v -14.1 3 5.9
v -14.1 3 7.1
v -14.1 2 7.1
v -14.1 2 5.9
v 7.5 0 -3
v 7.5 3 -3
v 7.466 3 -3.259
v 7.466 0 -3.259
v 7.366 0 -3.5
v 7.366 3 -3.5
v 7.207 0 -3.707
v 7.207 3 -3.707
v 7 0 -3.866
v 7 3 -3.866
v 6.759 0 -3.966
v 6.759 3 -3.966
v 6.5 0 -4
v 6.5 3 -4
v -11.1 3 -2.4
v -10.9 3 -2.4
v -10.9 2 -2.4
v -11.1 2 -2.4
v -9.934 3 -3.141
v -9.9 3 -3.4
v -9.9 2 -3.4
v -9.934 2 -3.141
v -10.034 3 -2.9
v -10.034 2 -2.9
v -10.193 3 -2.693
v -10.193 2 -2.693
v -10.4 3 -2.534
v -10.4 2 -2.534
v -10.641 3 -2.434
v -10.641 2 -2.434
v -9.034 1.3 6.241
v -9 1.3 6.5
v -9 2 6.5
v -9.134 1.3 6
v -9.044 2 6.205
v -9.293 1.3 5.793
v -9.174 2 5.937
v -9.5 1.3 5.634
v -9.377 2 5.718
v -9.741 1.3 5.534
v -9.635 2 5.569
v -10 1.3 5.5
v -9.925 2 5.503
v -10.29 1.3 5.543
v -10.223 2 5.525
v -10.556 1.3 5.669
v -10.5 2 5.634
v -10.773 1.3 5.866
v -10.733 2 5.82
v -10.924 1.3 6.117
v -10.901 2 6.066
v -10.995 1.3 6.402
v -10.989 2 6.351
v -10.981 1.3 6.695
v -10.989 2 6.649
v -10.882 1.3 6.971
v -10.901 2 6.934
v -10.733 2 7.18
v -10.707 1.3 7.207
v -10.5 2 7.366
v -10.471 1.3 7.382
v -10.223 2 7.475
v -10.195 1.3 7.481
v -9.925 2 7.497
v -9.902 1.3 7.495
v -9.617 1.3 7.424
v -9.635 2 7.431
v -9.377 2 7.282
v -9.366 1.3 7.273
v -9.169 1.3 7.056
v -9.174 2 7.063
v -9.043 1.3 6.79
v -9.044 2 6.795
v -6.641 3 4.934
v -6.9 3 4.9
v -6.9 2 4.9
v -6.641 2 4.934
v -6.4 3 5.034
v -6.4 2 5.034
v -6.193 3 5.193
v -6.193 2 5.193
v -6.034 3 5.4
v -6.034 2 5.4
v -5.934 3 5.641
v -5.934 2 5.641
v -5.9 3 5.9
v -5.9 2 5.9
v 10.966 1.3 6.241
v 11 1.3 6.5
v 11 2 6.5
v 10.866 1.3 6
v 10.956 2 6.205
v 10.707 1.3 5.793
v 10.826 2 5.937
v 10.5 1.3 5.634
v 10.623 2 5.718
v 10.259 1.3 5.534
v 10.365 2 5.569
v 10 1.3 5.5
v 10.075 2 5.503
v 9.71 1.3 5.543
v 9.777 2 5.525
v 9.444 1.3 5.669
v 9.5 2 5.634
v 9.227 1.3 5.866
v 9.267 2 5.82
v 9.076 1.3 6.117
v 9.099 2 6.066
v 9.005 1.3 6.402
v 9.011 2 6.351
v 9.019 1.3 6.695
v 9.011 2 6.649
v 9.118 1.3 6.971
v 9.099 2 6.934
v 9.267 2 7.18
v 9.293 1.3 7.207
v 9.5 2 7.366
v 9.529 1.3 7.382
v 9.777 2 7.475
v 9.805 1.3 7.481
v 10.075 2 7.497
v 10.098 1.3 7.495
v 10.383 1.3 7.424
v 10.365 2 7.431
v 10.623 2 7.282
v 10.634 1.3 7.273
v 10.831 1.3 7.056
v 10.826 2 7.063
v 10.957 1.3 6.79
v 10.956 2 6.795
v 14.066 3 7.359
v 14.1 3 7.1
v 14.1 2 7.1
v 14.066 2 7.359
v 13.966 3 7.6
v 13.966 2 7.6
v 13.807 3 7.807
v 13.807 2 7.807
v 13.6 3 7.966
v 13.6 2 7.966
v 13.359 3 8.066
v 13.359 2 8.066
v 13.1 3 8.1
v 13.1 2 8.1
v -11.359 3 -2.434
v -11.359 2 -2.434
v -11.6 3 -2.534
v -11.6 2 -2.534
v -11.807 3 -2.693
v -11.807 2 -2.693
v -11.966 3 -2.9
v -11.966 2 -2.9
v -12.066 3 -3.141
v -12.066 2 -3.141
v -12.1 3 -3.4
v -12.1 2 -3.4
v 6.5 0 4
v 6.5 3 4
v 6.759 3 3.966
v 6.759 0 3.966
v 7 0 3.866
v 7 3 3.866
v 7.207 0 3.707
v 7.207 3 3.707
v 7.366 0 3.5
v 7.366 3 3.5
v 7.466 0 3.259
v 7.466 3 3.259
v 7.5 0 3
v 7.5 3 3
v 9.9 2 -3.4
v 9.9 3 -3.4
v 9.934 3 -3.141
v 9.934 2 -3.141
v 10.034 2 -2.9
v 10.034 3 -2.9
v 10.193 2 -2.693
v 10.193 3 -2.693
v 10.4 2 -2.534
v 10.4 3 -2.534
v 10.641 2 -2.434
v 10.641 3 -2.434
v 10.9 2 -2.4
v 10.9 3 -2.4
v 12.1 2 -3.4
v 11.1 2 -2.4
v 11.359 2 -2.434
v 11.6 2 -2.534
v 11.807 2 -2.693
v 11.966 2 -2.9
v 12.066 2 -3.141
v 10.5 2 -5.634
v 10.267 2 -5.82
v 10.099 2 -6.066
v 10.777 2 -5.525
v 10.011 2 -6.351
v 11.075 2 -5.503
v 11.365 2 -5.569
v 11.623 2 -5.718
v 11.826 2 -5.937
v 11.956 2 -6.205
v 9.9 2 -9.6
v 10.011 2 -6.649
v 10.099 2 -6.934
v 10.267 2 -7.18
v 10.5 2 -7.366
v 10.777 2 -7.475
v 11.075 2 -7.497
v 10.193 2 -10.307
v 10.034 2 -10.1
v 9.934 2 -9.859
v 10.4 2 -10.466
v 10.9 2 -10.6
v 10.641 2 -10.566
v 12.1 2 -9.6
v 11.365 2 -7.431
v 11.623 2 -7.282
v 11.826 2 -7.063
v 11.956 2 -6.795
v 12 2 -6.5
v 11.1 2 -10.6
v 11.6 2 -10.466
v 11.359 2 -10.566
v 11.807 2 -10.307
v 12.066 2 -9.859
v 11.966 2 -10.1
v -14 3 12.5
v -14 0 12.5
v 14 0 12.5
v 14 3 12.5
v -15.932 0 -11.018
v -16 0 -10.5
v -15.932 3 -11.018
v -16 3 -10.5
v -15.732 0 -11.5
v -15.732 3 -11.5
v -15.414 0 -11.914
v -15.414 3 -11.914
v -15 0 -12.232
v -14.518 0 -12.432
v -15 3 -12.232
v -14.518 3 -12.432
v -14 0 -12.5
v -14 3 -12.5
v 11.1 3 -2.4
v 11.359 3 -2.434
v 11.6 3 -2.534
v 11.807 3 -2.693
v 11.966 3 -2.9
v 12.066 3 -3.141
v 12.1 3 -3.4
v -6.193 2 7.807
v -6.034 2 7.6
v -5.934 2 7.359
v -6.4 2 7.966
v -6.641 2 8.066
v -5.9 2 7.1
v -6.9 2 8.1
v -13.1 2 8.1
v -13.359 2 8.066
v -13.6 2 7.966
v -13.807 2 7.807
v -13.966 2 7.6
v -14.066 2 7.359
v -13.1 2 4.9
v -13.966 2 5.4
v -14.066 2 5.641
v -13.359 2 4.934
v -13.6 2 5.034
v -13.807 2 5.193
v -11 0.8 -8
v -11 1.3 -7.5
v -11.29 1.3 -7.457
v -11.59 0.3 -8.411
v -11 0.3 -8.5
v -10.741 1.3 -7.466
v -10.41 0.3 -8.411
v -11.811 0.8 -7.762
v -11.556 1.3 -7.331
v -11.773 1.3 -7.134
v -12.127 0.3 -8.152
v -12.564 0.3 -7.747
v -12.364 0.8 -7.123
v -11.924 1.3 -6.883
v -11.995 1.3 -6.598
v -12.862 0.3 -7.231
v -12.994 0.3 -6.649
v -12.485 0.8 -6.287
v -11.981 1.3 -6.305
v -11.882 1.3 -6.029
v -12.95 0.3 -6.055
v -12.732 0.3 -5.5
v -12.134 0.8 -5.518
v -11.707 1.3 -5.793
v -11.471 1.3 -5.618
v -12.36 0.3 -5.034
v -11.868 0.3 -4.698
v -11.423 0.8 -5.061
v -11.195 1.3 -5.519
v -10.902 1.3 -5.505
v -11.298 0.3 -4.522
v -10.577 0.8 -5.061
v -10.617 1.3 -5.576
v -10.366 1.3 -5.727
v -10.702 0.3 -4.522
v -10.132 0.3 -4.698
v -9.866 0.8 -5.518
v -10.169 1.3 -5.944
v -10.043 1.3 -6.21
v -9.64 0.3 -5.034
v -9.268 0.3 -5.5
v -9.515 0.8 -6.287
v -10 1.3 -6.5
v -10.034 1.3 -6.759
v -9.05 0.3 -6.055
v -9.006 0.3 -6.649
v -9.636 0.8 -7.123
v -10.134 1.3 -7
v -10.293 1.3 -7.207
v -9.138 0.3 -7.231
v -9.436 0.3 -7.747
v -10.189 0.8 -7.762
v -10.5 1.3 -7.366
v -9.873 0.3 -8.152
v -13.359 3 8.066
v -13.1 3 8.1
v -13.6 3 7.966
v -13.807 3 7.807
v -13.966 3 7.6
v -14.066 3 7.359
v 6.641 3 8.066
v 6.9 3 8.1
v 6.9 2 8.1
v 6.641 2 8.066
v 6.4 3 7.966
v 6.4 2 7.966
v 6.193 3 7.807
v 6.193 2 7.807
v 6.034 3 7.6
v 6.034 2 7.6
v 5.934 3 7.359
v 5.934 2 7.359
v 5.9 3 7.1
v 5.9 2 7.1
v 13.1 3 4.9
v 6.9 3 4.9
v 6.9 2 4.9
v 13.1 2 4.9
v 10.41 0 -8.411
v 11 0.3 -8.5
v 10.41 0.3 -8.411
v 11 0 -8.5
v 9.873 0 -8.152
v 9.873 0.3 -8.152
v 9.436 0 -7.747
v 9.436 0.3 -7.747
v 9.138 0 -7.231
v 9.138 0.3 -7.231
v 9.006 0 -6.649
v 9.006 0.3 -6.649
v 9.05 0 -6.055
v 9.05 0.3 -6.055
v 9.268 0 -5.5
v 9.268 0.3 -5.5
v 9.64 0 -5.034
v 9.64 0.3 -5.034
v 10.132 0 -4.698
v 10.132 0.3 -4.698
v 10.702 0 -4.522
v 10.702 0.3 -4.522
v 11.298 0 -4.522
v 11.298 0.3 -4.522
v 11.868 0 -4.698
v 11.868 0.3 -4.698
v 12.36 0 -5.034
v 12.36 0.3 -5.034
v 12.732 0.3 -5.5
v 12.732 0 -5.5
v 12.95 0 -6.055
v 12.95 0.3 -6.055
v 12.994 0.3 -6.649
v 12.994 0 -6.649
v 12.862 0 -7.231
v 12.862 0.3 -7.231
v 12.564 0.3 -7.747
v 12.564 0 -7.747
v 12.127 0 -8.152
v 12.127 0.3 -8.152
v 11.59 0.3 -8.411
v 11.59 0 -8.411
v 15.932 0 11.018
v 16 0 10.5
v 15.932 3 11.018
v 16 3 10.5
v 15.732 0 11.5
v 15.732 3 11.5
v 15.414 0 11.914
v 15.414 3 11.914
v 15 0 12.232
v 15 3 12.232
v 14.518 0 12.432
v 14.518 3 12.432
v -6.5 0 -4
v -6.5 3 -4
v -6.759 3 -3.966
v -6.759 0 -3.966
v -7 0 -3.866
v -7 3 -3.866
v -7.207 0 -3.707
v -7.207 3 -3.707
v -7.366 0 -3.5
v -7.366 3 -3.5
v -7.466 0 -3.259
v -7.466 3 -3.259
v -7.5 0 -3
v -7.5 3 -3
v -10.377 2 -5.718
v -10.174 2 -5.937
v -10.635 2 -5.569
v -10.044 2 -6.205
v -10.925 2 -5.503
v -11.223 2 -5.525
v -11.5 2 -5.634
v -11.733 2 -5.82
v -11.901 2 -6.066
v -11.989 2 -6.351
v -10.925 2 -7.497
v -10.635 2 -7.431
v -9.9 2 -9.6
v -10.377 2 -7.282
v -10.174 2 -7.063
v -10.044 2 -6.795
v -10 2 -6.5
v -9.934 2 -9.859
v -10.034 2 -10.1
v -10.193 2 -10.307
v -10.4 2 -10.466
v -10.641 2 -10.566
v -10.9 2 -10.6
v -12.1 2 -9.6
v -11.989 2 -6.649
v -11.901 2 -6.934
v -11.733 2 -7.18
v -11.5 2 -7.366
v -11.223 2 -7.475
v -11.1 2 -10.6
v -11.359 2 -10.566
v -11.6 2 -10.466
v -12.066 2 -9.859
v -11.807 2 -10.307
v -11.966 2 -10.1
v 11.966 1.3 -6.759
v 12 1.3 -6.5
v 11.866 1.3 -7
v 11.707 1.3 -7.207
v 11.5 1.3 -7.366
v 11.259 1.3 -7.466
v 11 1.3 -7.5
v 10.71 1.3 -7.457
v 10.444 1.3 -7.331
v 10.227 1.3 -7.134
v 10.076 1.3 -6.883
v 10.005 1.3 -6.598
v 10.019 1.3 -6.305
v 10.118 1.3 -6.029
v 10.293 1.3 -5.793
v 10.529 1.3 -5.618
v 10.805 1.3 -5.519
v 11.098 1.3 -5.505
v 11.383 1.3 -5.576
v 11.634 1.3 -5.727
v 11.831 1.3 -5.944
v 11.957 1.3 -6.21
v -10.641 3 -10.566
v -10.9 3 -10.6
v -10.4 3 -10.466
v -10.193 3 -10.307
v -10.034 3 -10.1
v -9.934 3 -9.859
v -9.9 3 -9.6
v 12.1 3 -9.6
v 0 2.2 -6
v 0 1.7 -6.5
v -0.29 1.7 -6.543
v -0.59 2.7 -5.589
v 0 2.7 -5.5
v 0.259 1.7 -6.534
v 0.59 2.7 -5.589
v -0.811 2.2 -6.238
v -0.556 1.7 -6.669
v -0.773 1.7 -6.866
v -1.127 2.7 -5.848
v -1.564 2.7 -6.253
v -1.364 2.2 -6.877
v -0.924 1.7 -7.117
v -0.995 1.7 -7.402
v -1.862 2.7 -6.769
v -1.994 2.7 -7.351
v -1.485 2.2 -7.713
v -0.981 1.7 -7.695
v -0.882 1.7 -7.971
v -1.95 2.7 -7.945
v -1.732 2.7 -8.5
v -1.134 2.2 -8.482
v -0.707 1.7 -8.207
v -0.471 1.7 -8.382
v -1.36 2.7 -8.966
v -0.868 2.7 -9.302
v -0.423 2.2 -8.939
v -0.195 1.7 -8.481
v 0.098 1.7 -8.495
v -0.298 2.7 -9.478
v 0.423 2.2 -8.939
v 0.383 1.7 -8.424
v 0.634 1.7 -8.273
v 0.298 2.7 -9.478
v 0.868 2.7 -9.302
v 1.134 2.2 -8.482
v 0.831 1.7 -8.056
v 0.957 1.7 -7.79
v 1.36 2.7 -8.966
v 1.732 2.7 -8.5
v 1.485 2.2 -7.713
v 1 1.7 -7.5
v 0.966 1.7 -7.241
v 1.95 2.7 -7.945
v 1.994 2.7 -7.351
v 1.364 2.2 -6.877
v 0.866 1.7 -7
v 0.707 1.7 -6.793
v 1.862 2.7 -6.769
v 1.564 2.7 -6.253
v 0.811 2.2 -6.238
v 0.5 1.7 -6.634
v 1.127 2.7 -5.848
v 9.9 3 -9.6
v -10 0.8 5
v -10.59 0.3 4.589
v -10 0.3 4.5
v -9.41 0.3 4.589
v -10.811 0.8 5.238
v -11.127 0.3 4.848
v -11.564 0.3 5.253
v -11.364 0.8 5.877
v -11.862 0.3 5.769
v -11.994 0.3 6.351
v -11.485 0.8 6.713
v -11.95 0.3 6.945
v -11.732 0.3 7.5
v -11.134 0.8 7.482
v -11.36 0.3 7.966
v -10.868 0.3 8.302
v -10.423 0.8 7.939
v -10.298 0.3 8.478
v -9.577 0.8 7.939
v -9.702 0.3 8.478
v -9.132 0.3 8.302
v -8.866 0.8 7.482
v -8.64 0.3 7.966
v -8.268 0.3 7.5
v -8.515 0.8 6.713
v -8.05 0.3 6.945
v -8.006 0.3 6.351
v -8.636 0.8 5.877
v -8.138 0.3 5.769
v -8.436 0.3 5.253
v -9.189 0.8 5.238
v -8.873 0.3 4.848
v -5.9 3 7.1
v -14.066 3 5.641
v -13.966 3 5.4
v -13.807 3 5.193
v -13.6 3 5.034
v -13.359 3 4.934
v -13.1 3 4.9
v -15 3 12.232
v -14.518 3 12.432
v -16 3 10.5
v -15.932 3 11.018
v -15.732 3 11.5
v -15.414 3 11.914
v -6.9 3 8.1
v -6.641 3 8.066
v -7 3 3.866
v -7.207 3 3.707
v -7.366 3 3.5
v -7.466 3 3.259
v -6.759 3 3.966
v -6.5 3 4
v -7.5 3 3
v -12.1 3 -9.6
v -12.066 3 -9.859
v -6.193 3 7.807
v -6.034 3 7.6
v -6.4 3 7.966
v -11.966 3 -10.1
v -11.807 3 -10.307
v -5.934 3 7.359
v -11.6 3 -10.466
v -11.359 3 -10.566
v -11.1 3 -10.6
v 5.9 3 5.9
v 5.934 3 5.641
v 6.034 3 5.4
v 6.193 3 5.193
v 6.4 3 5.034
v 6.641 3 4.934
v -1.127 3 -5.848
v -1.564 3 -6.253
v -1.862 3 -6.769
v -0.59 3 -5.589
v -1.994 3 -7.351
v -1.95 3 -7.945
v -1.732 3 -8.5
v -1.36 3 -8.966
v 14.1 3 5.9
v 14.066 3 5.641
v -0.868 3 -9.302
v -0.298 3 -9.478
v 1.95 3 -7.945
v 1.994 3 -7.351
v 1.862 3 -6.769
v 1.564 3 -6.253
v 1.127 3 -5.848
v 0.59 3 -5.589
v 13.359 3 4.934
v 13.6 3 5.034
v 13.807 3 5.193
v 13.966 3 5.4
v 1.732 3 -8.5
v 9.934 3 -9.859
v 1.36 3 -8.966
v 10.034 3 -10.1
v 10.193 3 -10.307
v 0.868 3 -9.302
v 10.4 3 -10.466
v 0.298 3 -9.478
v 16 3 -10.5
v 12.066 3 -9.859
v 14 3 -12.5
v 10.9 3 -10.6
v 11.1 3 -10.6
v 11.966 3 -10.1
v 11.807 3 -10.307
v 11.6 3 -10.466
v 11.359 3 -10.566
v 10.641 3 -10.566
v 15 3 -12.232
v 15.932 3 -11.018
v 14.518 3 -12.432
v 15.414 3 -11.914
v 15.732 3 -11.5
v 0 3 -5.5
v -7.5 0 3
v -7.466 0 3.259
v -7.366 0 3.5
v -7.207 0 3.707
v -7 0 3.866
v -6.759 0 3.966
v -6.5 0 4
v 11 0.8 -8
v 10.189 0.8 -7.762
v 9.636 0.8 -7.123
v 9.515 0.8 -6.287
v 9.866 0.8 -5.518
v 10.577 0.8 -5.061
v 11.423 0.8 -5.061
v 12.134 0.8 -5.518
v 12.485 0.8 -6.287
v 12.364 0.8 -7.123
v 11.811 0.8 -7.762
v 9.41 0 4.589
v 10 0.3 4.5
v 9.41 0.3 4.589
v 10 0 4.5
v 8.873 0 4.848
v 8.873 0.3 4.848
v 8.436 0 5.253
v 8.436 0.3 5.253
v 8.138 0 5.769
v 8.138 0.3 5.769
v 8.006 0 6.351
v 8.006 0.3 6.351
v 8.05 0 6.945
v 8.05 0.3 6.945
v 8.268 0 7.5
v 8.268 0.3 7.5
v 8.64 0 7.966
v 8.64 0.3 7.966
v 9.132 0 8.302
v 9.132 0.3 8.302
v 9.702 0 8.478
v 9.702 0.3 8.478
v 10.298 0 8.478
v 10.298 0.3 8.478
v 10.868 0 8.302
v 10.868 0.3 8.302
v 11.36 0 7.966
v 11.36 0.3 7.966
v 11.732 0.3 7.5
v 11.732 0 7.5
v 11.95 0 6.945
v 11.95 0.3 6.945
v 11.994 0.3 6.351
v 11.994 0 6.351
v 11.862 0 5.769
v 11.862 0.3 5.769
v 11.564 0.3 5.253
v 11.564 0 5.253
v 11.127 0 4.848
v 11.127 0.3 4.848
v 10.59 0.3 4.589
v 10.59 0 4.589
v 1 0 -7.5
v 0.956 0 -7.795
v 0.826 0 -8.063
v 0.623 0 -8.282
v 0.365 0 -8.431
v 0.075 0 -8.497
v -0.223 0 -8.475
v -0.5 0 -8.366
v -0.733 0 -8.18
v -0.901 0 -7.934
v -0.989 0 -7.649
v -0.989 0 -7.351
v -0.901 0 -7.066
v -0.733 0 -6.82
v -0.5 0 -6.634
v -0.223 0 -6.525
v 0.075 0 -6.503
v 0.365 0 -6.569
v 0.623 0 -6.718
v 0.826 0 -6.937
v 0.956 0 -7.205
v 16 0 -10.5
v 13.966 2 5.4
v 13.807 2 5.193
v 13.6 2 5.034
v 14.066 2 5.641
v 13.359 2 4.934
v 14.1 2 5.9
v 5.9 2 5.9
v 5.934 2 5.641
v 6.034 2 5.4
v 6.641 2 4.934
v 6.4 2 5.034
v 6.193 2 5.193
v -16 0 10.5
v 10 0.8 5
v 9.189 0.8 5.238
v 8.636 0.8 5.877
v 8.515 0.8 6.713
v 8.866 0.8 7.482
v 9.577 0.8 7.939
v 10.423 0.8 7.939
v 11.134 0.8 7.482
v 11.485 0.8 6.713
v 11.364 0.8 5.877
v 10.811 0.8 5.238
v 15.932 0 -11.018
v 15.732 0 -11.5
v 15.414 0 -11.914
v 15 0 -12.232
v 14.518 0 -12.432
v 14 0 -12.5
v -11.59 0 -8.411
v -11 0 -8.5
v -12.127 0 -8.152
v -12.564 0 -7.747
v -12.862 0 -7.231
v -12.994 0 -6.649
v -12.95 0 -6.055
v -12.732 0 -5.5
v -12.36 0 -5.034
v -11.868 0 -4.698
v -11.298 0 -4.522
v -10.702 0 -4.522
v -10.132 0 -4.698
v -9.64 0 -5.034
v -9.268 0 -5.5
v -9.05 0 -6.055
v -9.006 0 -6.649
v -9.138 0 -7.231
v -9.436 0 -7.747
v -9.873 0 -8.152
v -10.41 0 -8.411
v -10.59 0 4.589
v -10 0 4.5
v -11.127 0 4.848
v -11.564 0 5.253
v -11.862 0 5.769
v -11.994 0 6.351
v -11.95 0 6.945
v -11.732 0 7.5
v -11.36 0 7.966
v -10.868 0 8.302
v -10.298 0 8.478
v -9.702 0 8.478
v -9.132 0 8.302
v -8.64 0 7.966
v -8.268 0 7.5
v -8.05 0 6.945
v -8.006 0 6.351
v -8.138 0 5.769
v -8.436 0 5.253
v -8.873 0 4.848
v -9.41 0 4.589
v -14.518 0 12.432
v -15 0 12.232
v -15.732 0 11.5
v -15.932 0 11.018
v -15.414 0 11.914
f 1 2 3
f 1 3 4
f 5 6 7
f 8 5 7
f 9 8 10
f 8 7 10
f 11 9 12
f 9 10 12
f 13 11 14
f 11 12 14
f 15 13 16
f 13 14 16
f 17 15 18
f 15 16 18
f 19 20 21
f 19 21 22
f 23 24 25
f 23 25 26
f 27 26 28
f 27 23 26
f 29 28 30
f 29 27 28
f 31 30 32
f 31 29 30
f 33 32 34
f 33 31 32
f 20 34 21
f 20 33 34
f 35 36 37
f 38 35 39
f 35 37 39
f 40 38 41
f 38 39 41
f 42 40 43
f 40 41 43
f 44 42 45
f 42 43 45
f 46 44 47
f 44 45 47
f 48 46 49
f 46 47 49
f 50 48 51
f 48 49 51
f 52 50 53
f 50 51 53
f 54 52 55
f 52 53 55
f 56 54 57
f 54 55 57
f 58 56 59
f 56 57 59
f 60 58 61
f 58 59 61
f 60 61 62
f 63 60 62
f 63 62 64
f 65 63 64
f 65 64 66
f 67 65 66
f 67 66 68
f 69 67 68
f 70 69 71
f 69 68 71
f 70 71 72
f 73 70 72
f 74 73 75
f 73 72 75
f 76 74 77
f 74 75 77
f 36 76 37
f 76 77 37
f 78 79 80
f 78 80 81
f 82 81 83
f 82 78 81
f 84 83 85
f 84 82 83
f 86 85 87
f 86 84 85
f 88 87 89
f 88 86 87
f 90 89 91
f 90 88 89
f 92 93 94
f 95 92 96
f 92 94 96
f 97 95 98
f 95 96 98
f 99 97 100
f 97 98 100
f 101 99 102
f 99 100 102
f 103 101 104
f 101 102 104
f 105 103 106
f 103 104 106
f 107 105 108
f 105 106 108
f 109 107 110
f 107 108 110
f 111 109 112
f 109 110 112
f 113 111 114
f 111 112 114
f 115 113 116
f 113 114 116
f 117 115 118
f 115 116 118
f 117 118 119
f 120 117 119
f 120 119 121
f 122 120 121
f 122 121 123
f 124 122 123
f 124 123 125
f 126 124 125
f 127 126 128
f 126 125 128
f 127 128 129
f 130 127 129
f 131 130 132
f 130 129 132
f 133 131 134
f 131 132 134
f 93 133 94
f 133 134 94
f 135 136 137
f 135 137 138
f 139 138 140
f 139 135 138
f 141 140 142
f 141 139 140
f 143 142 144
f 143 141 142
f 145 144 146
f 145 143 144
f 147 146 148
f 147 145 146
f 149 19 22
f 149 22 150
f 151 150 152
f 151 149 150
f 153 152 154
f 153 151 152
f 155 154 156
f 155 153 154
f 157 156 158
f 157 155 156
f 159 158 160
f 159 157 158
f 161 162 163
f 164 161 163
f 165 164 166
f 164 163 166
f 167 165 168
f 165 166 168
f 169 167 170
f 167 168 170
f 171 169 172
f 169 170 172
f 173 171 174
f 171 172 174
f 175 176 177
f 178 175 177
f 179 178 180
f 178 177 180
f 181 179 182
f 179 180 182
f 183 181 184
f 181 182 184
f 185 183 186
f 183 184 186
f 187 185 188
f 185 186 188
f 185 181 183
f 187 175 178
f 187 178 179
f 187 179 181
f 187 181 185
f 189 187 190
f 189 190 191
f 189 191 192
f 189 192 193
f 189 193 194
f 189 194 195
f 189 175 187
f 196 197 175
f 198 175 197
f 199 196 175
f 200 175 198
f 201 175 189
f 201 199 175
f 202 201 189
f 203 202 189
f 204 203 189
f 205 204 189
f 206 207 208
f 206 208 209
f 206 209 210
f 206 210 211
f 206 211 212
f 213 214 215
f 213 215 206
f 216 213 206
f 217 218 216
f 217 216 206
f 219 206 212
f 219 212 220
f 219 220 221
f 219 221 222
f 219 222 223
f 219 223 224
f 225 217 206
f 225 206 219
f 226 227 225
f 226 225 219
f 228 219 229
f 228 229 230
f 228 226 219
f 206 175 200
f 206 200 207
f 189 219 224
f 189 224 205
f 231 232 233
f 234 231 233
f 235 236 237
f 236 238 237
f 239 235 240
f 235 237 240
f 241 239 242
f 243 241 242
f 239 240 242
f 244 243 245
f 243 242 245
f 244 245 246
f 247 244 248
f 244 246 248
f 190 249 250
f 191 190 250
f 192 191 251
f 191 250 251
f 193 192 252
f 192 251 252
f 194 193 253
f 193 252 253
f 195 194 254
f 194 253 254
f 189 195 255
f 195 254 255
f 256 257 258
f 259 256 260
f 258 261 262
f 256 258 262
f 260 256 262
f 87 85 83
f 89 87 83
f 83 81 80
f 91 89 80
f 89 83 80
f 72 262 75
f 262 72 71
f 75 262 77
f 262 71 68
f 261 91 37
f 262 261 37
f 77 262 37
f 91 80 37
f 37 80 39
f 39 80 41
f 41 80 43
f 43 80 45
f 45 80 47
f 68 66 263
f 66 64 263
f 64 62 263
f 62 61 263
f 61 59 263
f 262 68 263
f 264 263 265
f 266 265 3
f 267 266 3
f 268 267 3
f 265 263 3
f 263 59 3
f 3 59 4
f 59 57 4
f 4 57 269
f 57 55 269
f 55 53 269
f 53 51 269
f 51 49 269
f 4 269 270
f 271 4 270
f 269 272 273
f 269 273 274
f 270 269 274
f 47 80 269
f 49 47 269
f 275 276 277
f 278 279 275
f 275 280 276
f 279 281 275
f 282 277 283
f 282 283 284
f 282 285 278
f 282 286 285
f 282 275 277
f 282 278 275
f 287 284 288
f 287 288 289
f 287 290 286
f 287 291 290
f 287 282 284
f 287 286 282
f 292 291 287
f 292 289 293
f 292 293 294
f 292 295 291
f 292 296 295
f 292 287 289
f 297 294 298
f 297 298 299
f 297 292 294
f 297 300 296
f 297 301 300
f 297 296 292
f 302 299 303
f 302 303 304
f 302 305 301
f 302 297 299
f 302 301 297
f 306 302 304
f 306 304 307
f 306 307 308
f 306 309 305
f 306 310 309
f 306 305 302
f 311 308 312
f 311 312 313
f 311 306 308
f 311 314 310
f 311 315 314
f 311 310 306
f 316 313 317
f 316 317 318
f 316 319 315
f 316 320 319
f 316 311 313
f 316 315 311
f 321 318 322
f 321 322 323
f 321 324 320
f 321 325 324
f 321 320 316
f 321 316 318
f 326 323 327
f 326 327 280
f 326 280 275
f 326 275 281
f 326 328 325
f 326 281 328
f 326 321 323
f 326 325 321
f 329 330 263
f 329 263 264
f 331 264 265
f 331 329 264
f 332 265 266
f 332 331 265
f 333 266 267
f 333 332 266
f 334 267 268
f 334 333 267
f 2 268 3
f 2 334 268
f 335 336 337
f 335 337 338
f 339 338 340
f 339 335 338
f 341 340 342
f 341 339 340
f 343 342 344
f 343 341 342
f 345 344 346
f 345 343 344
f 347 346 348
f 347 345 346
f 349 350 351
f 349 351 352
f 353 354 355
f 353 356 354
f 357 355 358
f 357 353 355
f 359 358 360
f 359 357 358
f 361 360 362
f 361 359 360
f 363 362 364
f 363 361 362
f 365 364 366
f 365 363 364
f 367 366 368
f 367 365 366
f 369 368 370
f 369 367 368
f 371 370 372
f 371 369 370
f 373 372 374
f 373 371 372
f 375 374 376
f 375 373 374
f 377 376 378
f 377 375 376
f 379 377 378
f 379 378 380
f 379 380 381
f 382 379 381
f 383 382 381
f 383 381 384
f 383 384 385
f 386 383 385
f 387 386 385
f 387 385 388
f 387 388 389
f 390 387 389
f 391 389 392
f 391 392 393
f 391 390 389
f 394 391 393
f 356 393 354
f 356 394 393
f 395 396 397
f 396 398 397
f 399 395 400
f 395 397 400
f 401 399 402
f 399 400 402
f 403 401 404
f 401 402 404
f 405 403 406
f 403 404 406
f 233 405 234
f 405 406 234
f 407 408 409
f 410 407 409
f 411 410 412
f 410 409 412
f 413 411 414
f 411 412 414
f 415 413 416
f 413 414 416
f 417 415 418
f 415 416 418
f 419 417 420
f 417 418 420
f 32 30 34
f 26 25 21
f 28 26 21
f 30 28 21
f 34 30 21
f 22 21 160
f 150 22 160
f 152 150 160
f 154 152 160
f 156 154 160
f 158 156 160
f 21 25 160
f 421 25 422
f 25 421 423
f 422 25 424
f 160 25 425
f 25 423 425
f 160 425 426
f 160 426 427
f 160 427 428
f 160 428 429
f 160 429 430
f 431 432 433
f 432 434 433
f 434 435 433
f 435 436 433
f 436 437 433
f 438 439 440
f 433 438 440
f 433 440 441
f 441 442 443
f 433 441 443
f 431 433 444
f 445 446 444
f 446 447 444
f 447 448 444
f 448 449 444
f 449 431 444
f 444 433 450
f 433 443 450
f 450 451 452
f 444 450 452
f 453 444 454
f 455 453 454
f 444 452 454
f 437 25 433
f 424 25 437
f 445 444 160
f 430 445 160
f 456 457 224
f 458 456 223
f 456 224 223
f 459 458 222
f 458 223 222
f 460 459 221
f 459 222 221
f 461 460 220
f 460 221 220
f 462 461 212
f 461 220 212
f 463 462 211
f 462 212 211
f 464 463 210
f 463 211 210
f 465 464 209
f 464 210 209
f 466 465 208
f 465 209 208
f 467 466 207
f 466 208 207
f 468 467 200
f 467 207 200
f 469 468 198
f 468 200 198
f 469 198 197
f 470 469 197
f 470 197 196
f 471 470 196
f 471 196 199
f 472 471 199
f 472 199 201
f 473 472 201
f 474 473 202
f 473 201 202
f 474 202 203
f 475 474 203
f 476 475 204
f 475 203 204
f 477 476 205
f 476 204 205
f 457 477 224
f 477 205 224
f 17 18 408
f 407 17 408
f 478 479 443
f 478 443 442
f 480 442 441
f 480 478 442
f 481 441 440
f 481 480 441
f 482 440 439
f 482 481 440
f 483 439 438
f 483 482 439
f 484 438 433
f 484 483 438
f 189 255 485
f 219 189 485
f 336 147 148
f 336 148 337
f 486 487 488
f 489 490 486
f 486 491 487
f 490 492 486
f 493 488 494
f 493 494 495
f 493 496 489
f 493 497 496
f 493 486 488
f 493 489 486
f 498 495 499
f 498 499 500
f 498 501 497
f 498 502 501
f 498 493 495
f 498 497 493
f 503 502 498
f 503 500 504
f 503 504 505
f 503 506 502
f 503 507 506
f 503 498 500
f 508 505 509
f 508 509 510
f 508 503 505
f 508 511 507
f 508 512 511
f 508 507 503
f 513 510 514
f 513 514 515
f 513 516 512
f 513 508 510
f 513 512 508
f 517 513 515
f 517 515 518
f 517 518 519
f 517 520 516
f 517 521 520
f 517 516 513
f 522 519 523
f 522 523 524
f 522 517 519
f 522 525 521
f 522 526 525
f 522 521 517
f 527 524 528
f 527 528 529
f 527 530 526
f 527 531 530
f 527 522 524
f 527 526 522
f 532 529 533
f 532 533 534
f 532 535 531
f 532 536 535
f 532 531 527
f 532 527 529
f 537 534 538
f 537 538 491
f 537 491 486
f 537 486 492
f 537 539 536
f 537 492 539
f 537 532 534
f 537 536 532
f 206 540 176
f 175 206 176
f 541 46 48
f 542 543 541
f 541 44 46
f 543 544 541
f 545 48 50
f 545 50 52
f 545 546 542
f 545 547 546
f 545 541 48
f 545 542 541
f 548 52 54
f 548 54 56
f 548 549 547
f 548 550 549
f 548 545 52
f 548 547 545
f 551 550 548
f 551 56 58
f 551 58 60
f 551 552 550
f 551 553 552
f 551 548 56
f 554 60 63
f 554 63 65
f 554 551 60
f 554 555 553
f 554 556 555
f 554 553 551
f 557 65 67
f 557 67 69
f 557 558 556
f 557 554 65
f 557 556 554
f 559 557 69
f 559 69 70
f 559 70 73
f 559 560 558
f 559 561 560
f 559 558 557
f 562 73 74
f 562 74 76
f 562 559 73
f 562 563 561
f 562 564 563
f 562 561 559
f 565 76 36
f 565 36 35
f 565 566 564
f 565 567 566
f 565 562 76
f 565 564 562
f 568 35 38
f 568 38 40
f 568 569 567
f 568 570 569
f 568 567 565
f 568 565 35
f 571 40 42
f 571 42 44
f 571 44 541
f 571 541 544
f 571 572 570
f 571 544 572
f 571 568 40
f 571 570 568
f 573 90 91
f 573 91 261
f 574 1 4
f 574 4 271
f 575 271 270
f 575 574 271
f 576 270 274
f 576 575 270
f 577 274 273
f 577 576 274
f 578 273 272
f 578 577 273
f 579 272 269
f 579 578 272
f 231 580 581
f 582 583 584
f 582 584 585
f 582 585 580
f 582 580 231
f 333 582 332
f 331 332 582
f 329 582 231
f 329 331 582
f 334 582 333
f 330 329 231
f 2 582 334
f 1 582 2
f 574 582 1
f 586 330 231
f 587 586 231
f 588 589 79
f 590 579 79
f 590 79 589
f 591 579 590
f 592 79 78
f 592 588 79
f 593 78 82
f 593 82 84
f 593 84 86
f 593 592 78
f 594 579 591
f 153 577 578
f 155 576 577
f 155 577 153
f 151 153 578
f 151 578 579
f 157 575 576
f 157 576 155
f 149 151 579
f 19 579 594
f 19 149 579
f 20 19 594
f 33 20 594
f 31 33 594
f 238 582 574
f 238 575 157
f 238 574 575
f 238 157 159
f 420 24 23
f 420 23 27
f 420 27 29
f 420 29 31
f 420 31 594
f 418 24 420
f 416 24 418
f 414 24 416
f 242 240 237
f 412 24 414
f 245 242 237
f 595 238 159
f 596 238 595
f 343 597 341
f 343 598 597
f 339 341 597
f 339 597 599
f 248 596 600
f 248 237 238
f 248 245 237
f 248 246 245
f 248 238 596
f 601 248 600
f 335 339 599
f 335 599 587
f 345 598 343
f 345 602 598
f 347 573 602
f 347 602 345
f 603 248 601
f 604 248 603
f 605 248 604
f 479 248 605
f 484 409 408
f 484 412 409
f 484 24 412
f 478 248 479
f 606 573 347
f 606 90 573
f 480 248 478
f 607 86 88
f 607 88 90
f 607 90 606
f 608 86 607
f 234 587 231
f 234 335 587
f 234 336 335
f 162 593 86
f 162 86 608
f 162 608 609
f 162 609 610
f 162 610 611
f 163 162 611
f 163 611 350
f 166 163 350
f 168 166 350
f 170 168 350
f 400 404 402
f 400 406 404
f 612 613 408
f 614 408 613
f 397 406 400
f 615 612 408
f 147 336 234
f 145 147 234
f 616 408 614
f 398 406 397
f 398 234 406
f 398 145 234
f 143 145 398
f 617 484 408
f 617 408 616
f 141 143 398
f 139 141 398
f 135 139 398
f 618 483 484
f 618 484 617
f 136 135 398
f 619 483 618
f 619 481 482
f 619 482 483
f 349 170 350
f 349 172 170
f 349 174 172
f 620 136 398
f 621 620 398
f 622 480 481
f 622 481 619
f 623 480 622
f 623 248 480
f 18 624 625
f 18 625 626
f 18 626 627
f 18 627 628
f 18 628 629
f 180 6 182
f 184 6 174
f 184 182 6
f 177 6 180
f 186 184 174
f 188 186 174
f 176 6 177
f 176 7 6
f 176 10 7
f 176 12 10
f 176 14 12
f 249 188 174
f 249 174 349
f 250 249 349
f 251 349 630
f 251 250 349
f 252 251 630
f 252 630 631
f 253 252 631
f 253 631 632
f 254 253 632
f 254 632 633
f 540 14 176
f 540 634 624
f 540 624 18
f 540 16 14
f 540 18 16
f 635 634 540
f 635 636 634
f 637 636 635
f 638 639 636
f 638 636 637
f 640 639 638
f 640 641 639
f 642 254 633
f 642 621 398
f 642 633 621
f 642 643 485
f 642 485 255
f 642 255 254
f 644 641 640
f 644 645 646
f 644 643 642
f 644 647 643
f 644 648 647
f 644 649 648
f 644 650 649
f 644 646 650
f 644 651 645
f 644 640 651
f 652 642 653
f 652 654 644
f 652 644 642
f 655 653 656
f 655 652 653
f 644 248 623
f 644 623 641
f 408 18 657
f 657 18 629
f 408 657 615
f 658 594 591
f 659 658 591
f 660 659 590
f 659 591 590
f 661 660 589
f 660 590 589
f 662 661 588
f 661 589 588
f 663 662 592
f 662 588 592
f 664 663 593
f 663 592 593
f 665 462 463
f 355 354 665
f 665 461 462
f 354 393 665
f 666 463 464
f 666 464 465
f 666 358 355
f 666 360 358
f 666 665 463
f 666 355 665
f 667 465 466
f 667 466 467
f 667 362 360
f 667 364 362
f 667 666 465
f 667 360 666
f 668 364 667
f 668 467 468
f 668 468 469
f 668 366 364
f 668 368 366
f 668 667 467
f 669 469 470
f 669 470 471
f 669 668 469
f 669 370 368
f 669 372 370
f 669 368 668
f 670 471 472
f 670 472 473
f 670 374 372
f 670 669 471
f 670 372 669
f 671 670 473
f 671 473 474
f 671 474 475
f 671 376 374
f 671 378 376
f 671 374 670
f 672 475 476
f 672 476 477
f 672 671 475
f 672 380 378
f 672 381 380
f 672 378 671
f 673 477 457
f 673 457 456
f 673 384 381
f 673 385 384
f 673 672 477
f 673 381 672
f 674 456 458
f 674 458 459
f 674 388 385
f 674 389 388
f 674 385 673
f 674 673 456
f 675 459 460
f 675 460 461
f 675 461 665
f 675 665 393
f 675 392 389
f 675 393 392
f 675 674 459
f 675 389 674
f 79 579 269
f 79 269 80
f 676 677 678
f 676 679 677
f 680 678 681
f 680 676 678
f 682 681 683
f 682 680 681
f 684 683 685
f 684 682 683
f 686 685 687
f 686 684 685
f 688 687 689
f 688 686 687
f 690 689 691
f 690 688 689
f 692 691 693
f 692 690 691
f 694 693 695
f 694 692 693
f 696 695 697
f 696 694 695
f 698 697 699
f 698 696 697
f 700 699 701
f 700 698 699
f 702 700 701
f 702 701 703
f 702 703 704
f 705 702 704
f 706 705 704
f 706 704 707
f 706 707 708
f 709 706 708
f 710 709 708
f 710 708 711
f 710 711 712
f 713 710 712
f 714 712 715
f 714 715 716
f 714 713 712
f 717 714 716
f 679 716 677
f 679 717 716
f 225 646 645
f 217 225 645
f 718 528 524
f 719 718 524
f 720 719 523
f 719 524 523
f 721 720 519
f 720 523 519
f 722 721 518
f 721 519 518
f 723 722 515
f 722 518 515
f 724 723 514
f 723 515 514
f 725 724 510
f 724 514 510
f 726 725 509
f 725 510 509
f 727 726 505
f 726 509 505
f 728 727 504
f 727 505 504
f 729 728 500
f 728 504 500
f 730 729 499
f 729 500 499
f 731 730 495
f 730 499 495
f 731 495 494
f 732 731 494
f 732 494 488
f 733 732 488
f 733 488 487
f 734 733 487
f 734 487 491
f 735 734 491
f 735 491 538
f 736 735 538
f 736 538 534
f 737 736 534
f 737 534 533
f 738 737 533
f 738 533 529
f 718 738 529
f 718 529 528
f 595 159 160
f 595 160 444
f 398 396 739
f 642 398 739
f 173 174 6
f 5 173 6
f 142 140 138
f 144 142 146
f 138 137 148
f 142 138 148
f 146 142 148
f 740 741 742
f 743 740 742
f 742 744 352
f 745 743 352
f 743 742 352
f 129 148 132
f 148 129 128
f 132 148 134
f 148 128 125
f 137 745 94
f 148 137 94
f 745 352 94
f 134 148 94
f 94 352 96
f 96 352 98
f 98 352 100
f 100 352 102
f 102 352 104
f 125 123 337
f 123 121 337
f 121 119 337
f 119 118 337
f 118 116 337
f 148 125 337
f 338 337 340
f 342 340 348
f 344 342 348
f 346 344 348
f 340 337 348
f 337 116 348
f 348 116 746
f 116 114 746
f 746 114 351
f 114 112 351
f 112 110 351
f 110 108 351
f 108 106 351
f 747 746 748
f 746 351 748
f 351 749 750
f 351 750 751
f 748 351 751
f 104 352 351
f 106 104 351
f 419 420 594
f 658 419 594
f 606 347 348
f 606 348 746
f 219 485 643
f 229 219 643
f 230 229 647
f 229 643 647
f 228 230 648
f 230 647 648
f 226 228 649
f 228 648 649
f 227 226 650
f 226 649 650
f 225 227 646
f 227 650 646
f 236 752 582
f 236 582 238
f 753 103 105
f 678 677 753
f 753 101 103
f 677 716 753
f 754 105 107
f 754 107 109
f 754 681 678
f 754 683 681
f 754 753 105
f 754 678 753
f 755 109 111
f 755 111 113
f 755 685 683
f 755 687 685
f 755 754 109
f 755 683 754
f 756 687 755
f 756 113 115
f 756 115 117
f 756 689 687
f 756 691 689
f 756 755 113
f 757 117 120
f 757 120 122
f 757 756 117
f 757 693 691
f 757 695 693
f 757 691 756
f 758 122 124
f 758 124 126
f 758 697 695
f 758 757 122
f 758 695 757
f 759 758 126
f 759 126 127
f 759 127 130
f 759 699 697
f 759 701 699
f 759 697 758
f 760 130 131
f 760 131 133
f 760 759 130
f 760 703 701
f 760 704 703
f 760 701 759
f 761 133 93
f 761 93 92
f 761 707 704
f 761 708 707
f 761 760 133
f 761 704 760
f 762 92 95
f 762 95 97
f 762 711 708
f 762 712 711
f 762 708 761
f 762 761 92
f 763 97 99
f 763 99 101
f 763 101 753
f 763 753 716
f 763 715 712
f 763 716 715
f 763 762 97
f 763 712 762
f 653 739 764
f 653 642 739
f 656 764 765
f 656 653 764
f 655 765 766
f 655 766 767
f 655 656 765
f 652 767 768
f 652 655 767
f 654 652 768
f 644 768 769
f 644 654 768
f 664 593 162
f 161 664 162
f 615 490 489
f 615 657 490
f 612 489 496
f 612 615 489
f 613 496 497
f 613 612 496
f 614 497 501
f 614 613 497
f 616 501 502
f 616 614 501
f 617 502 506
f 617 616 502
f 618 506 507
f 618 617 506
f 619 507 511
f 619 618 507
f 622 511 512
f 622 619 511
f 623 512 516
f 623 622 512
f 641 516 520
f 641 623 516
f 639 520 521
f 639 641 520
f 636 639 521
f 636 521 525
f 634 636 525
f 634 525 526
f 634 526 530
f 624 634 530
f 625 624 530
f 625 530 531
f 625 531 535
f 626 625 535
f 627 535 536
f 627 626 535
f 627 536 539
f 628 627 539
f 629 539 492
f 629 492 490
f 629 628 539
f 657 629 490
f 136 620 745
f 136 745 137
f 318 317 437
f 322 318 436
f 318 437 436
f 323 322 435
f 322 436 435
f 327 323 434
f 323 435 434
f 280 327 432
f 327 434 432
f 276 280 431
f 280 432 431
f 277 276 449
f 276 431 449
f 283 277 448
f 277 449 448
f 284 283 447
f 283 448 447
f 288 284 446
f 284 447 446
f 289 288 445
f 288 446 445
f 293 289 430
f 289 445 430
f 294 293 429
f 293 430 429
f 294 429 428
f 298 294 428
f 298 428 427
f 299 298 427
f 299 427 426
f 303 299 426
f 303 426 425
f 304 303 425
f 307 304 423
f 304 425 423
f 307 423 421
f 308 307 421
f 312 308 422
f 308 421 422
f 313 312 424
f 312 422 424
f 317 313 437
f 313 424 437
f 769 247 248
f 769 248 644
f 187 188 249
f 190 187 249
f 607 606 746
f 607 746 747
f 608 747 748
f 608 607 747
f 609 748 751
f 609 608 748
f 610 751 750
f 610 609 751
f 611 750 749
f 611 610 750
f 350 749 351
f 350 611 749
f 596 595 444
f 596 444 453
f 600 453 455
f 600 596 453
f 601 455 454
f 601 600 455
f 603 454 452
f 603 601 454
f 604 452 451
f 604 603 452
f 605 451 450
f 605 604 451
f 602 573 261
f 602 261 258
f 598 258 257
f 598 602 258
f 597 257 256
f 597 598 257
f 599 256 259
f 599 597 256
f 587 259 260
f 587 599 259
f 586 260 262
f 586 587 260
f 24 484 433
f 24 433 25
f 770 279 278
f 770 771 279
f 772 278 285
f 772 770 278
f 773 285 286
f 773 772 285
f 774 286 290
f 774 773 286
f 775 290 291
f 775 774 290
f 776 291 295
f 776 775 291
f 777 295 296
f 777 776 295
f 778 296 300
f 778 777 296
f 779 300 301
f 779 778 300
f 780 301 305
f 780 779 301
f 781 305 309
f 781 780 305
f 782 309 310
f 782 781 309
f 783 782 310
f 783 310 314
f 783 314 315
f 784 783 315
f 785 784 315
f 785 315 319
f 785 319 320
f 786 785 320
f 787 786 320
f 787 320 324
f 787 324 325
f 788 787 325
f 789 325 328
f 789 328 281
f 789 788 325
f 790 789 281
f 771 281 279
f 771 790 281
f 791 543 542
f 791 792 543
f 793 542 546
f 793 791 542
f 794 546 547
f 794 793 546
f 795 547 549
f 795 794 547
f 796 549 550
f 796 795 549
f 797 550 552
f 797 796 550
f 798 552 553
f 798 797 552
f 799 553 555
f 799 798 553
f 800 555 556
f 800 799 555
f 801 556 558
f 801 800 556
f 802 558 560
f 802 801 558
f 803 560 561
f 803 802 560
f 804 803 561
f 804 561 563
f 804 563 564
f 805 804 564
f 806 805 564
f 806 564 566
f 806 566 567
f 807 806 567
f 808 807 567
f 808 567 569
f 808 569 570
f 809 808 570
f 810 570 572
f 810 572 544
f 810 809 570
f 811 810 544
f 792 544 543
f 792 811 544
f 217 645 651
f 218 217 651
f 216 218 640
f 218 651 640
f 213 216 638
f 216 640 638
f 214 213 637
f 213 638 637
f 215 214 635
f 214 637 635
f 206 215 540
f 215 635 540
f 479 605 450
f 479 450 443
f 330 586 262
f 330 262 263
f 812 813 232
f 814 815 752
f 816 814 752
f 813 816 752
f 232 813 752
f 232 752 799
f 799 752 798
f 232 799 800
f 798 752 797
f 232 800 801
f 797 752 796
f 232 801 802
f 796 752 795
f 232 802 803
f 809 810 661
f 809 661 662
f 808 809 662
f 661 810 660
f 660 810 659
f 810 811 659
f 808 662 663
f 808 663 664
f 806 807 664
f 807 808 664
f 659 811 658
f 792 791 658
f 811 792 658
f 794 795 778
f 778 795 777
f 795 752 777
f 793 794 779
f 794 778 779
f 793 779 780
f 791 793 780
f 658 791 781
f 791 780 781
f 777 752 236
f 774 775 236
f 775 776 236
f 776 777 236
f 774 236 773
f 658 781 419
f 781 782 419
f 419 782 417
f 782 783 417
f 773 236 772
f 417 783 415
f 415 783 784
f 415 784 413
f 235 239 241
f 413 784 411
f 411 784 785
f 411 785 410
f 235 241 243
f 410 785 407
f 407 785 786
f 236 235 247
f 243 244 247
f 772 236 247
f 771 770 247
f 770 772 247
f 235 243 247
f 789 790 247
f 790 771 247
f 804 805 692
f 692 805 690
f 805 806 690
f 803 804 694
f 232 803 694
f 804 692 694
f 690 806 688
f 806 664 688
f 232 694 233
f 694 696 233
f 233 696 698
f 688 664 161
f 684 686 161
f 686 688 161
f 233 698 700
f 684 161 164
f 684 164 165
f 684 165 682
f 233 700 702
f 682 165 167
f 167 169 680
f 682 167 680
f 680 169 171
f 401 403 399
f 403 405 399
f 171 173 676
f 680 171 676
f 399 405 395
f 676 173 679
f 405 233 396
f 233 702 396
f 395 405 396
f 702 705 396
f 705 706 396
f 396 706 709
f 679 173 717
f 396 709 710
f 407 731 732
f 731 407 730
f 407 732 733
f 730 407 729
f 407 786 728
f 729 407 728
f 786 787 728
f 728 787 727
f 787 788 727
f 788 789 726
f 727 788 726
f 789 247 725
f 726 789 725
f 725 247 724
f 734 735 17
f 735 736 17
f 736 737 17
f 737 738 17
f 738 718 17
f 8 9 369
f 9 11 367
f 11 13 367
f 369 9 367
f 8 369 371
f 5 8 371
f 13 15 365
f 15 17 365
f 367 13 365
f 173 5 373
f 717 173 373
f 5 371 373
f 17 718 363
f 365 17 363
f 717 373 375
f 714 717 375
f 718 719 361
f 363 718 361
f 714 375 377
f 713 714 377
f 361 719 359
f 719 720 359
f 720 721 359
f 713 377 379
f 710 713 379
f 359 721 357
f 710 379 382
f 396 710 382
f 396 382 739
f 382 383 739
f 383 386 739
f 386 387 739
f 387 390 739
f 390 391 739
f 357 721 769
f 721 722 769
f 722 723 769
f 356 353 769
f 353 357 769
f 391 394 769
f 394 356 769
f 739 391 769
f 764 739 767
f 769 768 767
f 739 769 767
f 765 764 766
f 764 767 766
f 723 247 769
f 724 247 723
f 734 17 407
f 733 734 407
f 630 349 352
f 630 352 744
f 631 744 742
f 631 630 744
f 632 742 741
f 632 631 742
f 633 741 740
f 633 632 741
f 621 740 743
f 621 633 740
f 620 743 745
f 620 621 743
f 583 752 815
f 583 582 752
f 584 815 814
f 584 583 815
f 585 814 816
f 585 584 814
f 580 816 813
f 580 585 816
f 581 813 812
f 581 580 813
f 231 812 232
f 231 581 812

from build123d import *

# Parameters (mm, degrees)
SKETCH1_W                                      = 32
SKETCH1_H                                      = 25
BOSS_EXTRUDE1_DEPTH                            = 3
CUT_EXTRUDE1_DEPTH                             = 1
CUT_EXTRUDE2_REACH                             = 4
SKETCH3_R                                      = 1
CUT_EXTRUDE3_REACH                             = 5
SKETCH4_R                                      = 1
FILLET1_R                                      = 2
CUT_EXTRUDE4_REACH                             = 5
CSK_FOR_M2_FLAT_HEAD_MACHINE_SCREW5_AT_2_COUNT = 2
CSK_FOR_M2_FLAT_HEAD_MACHINE_SCREW5_AT_2_PITCH = 22
CSK_FOR_M2_FLAT_HEAD_MACHINE_SCREW5_AT_3_COUNT = 2
CSK_FOR_M2_FLAT_HEAD_MACHINE_SCREW5_AT_3_PITCH = 13.03840481
CSK_FOR_M2_FLAT_HEAD_MACHINE_SCREW5_AT_4_COUNT = 2
CSK_FOR_M2_FLAT_HEAD_MACHINE_SCREW5_AT_4_PITCH = 24.69817807


with BuildPart() as part:
    # Sketch1 → Boss-Extrude1 (new body)
    with BuildSketch(Plane(origin=(0, 0, 0), x_dir=(1, 0, 0), z_dir=(0, 1, 0))):
        Rectangle(SKETCH1_W, SKETCH1_H)
    extrude(amount=BOSS_EXTRUDE1_DEPTH)

    # Sketch2 → Cut-Extrude1 (cut)
    with BuildSketch(Plane(origin=(0, 3, 0), x_dir=(1, 0, 0), z_dir=(0, 1, 0))):
        with BuildLine():
            Line((14.1, -5.9), (14.1, -7.1))
            ThreePointArc((14.1, -7.1), (13.807106781, -7.807106781), (13.1, -8.1))
            Line((13.1, -8.1), (6.9, -8.1))
            ThreePointArc((6.9, -8.1), (6.192893219, -7.807106781), (5.9, -7.1))
            Line((5.9, -7.1), (5.9, -5.9))
            ThreePointArc((5.9, -5.9), (6.192893219, -5.192893219), (6.9, -4.9))
            Line((6.9, -4.9), (13.1, -4.9))
            ThreePointArc((13.1, -4.9), (13.807106781, -5.192893219), (14.1, -5.9))
        make_face()
        with BuildLine():
            Line((-13.1, -4.9), (-6.9, -4.9))
            ThreePointArc((-6.9, -4.9), (-6.192893219, -5.192893219), (-5.9, -5.9))
            Line((-5.9, -5.9), (-5.9, -7.1))
            ThreePointArc((-5.9, -7.1), (-6.192893219, -7.807106781), (-6.9, -8.1))
            Line((-6.9, -8.1), (-13.1, -8.1))
            ThreePointArc((-13.1, -8.1), (-13.807106781, -7.807106781), (-14.1, -7.1))
            Line((-14.1, -7.1), (-14.1, -5.9))
            ThreePointArc((-14.1, -5.9), (-13.807106781, -5.192893219), (-13.1, -4.9))
        make_face()
        with BuildLine():
            Line((11.1, 10.6), (10.9, 10.6))
            ThreePointArc((10.9, 10.6), (10.192893219, 10.307106781), (9.9, 9.6))
            Line((9.9, 9.6), (9.9, 3.4))
            ThreePointArc((9.9, 3.4), (10.192893219, 2.692893219), (10.9, 2.4))
            Line((10.9, 2.4), (11.1, 2.4))
            ThreePointArc((11.1, 2.4), (11.807106781, 2.692893219), (12.1, 3.4))
            Line((12.1, 3.4), (12.1, 9.6))
            ThreePointArc((12.1, 9.6), (11.807106781, 10.307106781), (11.1, 10.6))
        make_face()
        with BuildLine():
            Line((-11.1, 10.6), (-10.9, 10.6))
            ThreePointArc((-10.9, 10.6), (-10.192893219, 10.307106781), (-9.9, 9.6))
            Line((-9.9, 9.6), (-9.9, 3.4))
            ThreePointArc((-9.9, 3.4), (-10.192893219, 2.692893219), (-10.9, 2.4))
            Line((-10.9, 2.4), (-11.1, 2.4))
            ThreePointArc((-11.1, 2.4), (-11.807106781, 2.692893219), (-12.1, 3.4))
            Line((-12.1, 3.4), (-12.1, 9.6))
            ThreePointArc((-12.1, 9.6), (-11.807106781, 10.307106781), (-11.1, 10.6))
        make_face()
    extrude(amount=-CUT_EXTRUDE1_DEPTH, mode=Mode.SUBTRACT)

    # Sketch3 → Cut-Extrude2 (cut, up to next)
    with BuildSketch(Plane(origin=(0, 2, 0), x_dir=(1, 0, 0), z_dir=(0, 1, 0)), mode=Mode.PRIVATE) as cut_extrude2_sk1:
        with Locations((-10, -6.5)):
            Circle(SKETCH3_R)
    cut_extrude2_tool1 = extrude(cut_extrude2_sk1.sketch, amount=-CUT_EXTRUDE2_REACH, mode=Mode.PRIVATE) & part.part
    add(cut_extrude2_tool1.solids().sort_by_distance((-10, 2, 6.5))[0], mode=Mode.SUBTRACT)
    # Sketch3 → Cut-Extrude2 (cut, up to next)
    with BuildSketch(Plane(origin=(0, 2, 0), x_dir=(1, 0, 0), z_dir=(0, 1, 0)), mode=Mode.PRIVATE) as cut_extrude2_sk2:
        with Locations((10, -6.5)):
            Circle(SKETCH3_R)
    cut_extrude2_tool2 = extrude(cut_extrude2_sk2.sketch, amount=-CUT_EXTRUDE2_REACH, mode=Mode.PRIVATE) & part.part
    add(cut_extrude2_tool2.solids().sort_by_distance((10, 2, 6.5))[0], mode=Mode.SUBTRACT)
    # Sketch3 → Cut-Extrude2 (cut, up to next)
    with BuildSketch(Plane(origin=(0, 2, 0), x_dir=(1, 0, 0), z_dir=(0, 1, 0)), mode=Mode.PRIVATE) as cut_extrude2_sk3:
        with Locations((-11, 6.5)):
            Circle(SKETCH3_R)
    cut_extrude2_tool3 = extrude(cut_extrude2_sk3.sketch, amount=-CUT_EXTRUDE2_REACH, mode=Mode.PRIVATE) & part.part
    add(cut_extrude2_tool3.solids().sort_by_distance((-11, 2, -6.5))[0], mode=Mode.SUBTRACT)
    # Sketch3 → Cut-Extrude2 (cut, up to next)
    with BuildSketch(Plane(origin=(0, 2, 0), x_dir=(1, 0, 0), z_dir=(0, 1, 0)), mode=Mode.PRIVATE) as cut_extrude2_sk4:
        with Locations((11, 6.5)):
            Circle(SKETCH3_R)
    cut_extrude2_tool4 = extrude(cut_extrude2_sk4.sketch, amount=-CUT_EXTRUDE2_REACH, mode=Mode.PRIVATE) & part.part
    add(cut_extrude2_tool4.solids().sort_by_distance((11, 2, -6.5))[0], mode=Mode.SUBTRACT)

    # Sketch4 → Cut-Extrude3 (cut, up to next)
    with BuildSketch(Plane(origin=(0, 3, 0), x_dir=(1, 0, 0), z_dir=(0, 1, 0)), mode=Mode.PRIVATE) as cut_extrude3_sk1:
        with Locations((0, 7.5)):
            Circle(SKETCH4_R)
    cut_extrude3_tool1 = extrude(cut_extrude3_sk1.sketch, amount=-CUT_EXTRUDE3_REACH, mode=Mode.PRIVATE) & part.part
    add(cut_extrude3_tool1.solids().sort_by_distance((0, 3, -7.5))[0], mode=Mode.SUBTRACT)

    # Sketch12 → CSK for M2 Flat Head Machine Screw4 (revolve, cut)
    with BuildSketch(Plane(origin=(0, 3, -7.5), x_dir=(0, 0, 1), z_dir=(1, 0, 0))):
        Polygon((0, 0), (0, 3), (1, 3), (1, 1.3), (2, 0.3), (2, 0), align=None)
    revolve(axis=Axis((0, 9.35, -7.5), (0, -1, 0)), mode=Mode.SUBTRACT)

    # Fillet1
    fillet1_edges = [part.edges().sort_by_distance(p)[0] for p in [
        (-16, 1.5, -12.5),
        (16, 1.5, -12.5),
        (16, 1.5, 12.5),
        (-16, 1.5, 12.5),
    ]]
    fillet(fillet1_edges, radius=FILLET1_R)

    # Sketch13 → Cut-Extrude4 (cut, up to next)
    with BuildSketch(Plane(origin=(0, 3, 0), x_dir=(1, 0, 0), z_dir=(0, 1, 0)), mode=Mode.PRIVATE) as cut_extrude4_sk1:
        with BuildLine():
            Line((6.5, 4), (-6.5, 4))
            ThreePointArc((-6.5, 4), (-7.207106781, 3.707106781), (-7.5, 3))
            Line((-7.5, 3), (-7.5, -3))
            ThreePointArc((-7.5, -3), (-7.207106781, -3.707106781), (-6.5, -4))
            Line((-6.5, -4), (6.5, -4))
            ThreePointArc((6.5, -4), (7.207106781, -3.707106781), (7.5, -3))
            Line((7.5, -3), (7.5, 3))
            ThreePointArc((7.5, 3), (7.207106781, 3.707106781), (6.5, 4))
        make_face()
    cut_extrude4_tool1 = extrude(cut_extrude4_sk1.sketch, amount=-CUT_EXTRUDE4_REACH, mode=Mode.PRIVATE) & part.part
    add(cut_extrude4_tool1.solids().sort_by_distance((0, 3, 0))[0], mode=Mode.SUBTRACT)

    # Sketch15 → CSK for M2 Flat Head Machine Screw5 (revolve, cut)
    with BuildSketch(Plane(origin=(11, 0, -6.5), x_dir=(0, 0, -1), z_dir=(1, 0, 0))):
        Polygon((0, 0), (0, 3), (1, 3), (1, 1.3), (2, 0.3), (2, 0), align=None)
    csk_for_m2_flat_head_machine_screw5 = revolve(axis=Axis((11, -6.35, -6.5), (0, 1, 0)), mode=Mode.SUBTRACT)

    # CSK for M2 Flat Head Machine Screw5 at 2: CSK for M2 Flat Head Machine Screw5 ×2
    with Locations(*[(-i * CSK_FOR_M2_FLAT_HEAD_MACHINE_SCREW5_AT_2_PITCH, 0, 0) for i in range(1, CSK_FOR_M2_FLAT_HEAD_MACHINE_SCREW5_AT_2_COUNT)]):
        add(csk_for_m2_flat_head_machine_screw5, mode=Mode.SUBTRACT)

    # CSK for M2 Flat Head Machine Screw5 at 3: CSK for M2 Flat Head Machine Screw5 ×2
    with Locations(*[Vector(-0.076696499, 0, 0.997054486) * (i * CSK_FOR_M2_FLAT_HEAD_MACHINE_SCREW5_AT_3_PITCH) for i in range(1, CSK_FOR_M2_FLAT_HEAD_MACHINE_SCREW5_AT_3_COUNT)]):
        add(csk_for_m2_flat_head_machine_screw5, mode=Mode.SUBTRACT)

    # CSK for M2 Flat Head Machine Screw5 at 4: CSK for M2 Flat Head Machine Screw5 ×2
    with Locations(*[Vector(-0.850265147, 0, 0.526354615) * (i * CSK_FOR_M2_FLAT_HEAD_MACHINE_SCREW5_AT_4_PITCH) for i in range(1, CSK_FOR_M2_FLAT_HEAD_MACHINE_SCREW5_AT_4_COUNT)]):
        add(csk_for_m2_flat_head_machine_screw5, mode=Mode.SUBTRACT)


solid = part.part
